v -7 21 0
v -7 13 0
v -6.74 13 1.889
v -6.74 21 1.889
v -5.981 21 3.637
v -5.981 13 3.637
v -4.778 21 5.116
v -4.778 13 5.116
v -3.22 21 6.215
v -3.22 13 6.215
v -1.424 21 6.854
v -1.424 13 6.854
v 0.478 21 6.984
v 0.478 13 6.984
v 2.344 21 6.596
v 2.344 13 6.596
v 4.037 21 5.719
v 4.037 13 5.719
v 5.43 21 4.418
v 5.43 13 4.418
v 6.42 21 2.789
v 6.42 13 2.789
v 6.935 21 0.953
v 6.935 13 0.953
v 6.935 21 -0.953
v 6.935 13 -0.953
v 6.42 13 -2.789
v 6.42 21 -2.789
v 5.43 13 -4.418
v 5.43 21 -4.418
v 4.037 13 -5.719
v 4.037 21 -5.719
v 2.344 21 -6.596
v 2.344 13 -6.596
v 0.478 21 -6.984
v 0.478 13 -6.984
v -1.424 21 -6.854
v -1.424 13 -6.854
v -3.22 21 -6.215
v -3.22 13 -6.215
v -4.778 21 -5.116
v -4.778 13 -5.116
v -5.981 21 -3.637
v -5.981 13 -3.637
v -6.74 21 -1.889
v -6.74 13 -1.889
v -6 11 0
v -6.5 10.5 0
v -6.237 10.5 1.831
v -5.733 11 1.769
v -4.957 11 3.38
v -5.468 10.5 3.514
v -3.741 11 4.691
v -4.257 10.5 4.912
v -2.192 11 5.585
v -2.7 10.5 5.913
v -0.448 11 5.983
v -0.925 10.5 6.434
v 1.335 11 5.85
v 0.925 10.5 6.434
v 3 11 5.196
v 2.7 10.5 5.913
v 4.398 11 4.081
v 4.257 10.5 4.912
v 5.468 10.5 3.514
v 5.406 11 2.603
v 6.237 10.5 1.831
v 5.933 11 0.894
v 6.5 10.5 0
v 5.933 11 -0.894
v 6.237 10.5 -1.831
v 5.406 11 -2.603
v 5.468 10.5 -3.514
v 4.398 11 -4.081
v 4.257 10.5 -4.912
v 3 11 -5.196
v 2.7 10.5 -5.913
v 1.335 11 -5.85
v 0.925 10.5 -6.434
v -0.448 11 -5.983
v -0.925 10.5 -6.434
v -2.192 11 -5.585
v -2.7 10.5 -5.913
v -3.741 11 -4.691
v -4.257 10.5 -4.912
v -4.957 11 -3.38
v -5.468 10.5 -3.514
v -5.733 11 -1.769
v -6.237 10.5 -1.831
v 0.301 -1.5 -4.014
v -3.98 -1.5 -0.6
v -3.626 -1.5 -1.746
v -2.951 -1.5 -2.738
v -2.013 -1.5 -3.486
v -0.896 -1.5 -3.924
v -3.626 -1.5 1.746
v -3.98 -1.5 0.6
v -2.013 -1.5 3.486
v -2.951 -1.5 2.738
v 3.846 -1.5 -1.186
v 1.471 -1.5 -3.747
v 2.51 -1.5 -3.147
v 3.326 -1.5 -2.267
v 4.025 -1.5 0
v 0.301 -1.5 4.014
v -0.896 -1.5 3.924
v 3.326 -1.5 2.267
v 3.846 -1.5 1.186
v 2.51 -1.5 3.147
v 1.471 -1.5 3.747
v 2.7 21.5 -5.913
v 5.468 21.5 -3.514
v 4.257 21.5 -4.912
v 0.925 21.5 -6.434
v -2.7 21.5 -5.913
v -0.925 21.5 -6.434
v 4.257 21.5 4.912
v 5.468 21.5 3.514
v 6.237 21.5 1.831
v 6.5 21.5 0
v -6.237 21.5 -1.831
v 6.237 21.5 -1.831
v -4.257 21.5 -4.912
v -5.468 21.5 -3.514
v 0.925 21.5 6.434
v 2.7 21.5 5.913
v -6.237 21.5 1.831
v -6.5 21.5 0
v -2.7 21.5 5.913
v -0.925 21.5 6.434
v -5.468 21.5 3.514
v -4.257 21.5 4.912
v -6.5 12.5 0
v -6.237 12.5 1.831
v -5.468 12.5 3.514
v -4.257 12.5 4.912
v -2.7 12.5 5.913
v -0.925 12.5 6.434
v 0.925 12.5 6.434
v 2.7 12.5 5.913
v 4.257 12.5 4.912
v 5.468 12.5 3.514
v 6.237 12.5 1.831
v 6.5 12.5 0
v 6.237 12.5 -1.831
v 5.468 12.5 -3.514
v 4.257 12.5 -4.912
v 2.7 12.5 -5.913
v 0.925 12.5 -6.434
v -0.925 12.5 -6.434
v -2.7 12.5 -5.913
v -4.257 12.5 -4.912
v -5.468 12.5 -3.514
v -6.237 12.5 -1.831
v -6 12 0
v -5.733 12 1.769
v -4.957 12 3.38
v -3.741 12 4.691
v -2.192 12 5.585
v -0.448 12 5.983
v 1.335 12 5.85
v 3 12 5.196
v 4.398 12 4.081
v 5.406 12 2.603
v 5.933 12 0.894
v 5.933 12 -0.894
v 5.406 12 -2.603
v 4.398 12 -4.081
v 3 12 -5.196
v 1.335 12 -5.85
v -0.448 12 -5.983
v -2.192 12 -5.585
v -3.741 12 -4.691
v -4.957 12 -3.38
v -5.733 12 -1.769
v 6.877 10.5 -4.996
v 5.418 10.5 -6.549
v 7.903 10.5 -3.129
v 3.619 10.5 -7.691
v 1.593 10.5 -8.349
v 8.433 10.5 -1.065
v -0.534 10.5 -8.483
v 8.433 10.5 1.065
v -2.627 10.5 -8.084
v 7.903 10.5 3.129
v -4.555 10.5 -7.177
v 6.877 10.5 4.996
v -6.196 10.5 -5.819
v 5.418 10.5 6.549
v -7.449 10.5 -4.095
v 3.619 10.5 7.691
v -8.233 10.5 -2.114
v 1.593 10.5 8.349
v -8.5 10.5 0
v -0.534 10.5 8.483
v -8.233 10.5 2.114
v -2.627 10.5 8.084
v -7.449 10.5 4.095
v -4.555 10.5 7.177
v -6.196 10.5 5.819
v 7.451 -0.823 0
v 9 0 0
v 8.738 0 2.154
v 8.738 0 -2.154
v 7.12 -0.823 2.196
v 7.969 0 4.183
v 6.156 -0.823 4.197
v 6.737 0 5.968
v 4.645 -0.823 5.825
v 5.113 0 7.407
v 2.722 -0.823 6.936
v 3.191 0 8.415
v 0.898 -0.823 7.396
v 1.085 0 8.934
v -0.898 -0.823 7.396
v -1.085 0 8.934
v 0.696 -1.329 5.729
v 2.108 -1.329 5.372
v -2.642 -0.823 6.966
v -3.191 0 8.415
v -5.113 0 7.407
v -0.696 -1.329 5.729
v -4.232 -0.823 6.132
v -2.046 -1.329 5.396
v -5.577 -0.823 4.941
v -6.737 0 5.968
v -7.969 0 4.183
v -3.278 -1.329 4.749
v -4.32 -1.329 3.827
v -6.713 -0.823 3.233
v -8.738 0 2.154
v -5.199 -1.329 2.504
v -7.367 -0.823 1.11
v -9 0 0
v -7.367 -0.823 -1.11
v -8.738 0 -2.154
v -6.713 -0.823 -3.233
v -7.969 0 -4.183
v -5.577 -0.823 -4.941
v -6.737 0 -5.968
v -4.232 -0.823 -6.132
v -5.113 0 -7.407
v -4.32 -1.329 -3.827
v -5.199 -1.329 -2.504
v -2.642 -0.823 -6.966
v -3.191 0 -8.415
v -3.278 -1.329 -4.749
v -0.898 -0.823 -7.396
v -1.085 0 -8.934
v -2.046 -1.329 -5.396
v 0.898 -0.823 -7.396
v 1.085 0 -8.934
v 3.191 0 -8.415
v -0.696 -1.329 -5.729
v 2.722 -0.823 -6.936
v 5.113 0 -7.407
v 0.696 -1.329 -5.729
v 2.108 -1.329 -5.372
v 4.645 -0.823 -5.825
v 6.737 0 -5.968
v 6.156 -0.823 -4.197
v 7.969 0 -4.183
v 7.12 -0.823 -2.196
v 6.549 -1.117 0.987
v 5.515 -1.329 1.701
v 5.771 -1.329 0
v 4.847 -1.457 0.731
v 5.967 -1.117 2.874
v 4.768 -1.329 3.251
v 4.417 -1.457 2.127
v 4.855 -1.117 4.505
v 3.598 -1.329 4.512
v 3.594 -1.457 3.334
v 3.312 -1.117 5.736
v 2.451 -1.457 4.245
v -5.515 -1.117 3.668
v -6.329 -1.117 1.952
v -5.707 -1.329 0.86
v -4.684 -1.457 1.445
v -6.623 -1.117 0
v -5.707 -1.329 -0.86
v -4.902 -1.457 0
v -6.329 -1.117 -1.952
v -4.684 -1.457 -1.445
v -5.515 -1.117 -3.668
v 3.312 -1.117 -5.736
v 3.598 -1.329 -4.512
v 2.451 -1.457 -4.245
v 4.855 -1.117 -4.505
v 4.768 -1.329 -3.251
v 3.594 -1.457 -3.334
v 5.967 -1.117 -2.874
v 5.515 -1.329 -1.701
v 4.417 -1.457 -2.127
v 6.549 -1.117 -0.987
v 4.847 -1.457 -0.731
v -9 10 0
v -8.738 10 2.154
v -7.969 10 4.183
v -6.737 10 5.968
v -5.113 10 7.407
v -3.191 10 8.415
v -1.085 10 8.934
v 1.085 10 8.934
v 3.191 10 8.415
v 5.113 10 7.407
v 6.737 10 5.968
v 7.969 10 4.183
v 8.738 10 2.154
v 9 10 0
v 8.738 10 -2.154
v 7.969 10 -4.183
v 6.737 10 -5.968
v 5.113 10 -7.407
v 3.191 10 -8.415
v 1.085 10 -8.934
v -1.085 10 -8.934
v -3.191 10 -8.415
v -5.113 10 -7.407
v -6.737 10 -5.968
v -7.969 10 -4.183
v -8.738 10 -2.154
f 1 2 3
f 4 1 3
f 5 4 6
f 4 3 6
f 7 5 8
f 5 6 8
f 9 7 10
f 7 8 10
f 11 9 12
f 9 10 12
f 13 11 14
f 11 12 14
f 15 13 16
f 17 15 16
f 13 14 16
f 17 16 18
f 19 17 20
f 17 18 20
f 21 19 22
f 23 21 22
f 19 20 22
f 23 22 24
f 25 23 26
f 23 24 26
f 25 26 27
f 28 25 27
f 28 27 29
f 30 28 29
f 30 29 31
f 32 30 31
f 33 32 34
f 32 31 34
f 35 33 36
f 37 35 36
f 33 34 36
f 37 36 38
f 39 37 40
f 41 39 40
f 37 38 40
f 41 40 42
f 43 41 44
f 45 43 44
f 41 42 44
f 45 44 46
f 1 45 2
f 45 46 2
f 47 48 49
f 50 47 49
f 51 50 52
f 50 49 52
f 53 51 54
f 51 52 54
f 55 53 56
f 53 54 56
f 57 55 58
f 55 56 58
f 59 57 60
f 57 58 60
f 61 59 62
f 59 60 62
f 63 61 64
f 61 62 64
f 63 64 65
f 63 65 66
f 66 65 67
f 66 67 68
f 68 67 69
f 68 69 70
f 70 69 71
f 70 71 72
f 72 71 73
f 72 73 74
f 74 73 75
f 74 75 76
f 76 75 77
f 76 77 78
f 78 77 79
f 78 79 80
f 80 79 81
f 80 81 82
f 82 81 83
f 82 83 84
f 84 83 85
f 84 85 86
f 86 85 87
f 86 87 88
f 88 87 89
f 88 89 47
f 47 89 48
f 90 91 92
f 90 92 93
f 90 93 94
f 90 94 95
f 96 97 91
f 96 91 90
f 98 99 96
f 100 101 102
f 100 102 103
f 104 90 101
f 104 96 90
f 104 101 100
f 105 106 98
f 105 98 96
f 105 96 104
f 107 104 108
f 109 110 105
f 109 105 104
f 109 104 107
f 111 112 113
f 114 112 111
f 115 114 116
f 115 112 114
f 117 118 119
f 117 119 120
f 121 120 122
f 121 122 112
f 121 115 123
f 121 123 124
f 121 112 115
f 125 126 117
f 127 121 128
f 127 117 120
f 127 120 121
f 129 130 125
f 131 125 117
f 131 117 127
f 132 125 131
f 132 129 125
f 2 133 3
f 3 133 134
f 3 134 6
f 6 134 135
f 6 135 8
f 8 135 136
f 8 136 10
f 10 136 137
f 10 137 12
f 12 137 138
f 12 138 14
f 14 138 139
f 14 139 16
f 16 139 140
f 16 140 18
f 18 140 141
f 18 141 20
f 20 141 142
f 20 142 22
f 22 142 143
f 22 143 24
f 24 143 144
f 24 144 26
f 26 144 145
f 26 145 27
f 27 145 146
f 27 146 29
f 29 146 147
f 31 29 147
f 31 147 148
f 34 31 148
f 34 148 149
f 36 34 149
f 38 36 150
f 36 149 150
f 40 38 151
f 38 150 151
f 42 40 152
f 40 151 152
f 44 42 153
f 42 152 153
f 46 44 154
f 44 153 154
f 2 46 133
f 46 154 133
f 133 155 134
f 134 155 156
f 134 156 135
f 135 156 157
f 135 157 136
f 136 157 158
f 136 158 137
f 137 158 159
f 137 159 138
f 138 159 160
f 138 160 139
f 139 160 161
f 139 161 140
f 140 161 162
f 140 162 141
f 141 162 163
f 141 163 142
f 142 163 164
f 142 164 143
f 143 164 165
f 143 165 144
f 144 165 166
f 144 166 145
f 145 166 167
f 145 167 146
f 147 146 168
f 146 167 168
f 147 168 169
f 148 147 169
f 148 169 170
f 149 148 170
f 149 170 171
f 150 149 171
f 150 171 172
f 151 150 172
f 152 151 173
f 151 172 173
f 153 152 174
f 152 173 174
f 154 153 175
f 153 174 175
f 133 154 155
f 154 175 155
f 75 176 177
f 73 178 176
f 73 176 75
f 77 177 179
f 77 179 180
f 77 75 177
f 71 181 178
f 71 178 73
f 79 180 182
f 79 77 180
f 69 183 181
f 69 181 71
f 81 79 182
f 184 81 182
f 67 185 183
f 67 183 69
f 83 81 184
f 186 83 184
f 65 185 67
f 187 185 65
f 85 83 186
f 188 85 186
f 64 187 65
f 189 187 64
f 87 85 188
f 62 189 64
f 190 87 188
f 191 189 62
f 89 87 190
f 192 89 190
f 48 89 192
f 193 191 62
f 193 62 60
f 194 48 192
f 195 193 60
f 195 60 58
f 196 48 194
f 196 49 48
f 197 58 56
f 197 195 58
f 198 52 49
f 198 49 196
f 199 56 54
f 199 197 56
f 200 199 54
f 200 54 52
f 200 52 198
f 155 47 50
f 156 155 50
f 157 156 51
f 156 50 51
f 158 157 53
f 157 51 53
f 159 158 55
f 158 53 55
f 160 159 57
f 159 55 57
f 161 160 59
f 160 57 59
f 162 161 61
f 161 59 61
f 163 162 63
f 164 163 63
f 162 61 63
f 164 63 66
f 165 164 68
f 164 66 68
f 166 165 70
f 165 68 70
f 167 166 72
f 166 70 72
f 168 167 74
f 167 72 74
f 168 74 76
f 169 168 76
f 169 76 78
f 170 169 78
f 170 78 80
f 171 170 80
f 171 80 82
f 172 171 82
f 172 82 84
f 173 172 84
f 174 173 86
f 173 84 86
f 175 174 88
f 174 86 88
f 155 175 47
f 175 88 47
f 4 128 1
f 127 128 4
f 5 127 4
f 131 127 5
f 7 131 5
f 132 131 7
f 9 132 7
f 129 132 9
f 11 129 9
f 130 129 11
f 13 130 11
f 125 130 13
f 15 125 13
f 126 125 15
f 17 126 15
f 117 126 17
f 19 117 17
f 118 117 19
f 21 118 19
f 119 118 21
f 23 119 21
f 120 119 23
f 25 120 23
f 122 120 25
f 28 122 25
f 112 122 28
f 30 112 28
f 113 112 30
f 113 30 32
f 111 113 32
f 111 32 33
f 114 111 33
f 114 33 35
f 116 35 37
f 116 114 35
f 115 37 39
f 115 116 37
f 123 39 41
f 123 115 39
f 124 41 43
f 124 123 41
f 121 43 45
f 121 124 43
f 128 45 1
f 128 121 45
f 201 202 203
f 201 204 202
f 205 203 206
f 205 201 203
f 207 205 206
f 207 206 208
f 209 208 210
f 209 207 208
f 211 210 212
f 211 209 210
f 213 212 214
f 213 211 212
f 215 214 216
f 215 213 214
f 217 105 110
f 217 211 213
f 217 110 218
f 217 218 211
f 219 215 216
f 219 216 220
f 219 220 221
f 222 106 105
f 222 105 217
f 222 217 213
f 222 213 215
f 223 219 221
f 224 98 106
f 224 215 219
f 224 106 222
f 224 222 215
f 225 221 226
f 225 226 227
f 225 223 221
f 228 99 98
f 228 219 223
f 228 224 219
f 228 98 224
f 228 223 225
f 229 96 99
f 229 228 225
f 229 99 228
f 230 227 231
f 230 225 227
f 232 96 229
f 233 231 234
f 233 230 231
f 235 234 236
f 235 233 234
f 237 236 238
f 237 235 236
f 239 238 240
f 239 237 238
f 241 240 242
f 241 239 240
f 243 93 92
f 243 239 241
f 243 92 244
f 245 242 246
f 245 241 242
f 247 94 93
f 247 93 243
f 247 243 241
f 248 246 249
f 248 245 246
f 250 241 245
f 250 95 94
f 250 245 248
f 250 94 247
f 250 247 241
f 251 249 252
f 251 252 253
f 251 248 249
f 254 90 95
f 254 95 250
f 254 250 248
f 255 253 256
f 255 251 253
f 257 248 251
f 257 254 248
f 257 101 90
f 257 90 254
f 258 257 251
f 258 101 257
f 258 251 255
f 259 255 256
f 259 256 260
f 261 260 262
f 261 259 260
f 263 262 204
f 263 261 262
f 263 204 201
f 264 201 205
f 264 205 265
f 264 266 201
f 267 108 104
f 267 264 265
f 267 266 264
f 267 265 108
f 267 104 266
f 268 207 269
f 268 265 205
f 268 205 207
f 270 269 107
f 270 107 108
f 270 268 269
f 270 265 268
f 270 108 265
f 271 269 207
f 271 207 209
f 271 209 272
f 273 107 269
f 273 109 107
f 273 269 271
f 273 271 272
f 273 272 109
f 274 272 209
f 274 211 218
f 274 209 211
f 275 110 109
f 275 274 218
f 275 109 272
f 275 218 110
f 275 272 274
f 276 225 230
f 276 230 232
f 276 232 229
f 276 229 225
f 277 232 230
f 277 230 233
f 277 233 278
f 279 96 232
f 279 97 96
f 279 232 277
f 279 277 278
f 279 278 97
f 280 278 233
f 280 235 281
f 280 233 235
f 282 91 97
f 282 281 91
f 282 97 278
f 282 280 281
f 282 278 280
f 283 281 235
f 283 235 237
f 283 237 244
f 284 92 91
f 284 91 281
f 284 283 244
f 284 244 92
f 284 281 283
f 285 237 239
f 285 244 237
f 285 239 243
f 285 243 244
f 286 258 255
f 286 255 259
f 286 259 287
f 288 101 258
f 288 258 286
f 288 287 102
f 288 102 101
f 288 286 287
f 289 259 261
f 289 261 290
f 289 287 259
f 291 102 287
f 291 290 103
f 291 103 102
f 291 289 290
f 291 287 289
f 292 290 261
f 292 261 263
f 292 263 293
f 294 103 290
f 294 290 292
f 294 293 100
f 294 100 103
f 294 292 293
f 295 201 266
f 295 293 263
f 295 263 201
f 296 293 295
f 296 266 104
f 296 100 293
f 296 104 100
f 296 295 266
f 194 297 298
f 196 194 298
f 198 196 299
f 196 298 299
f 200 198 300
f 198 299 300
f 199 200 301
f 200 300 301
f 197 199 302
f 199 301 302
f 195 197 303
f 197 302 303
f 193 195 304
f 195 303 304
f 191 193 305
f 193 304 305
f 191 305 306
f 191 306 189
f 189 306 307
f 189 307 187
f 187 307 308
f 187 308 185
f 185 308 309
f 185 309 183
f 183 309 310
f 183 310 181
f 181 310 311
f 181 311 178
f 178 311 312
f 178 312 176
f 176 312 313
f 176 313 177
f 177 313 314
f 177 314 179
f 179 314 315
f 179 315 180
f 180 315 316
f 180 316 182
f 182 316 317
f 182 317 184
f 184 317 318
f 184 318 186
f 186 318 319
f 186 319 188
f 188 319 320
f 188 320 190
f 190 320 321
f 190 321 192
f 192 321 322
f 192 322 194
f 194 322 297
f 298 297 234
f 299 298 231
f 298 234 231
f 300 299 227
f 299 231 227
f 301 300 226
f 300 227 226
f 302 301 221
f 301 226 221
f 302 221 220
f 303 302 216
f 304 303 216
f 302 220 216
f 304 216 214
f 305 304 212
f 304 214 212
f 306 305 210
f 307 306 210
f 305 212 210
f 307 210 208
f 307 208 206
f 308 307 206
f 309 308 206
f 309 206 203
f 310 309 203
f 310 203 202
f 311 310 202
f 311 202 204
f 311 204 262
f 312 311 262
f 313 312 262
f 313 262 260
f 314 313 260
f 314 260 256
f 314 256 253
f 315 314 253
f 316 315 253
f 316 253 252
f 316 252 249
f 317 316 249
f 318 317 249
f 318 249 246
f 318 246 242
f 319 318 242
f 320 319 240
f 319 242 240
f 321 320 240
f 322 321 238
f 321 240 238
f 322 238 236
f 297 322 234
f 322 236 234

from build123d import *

# Parameters (mm, degrees)
F0_R     = 9
F1_DEPTH = 1.5
F3_R     = 9
F4_DEPTH = 10.5
F5_R     = 6
F6_DEPTH = 2
F7_R     = 7
F8_DEPTH = 9
F9_SIZE  = 0.49999


# Not quite as in the source:
# - a fillet or chamfer that OpenCascade refuses, or shapes differently, is made with other operations: its cross-section is extruded or revolved along the edge and cut away or added
# - a fillet or chamfer is up to 0.001 mm smaller than in the source, because OpenCascade refuses the exact size


with BuildPart() as f1:
    # F0 (on Front) → F1 (new body)
    with BuildSketch(Plane.XZ):
        Circle(F0_R)
    extrude(amount=F1_DEPTH)

    # F2: fillet of radius 9 on 1 edges, made by hand

    # F2_s1 → F2_t2 (revolve, cut)
    with BuildSketch(Plane.XY):
        with BuildLine():
            ThreePointArc((9, 0), (6.6231390258, -1.1168439698), (4.0250628145, -1.5))
            Line((4.0250628145, -1.5), (4.0250628145, -1.68))
            Line((4.0250628145, -1.68), (9, -1.68))
            Line((9, -1.68), (9.18, -1.5))
            ThreePointArc((9.18, -1.5), (9.18, -0.75), (9.0994987437, -0.15))
            Line((9.0994987437, -0.15), (9, 0))
        make_face()
    revolve(axis=Axis((0, -1.5, 0), (0, -1, 0)), mode=Mode.SUBTRACT)

    # F3 (on face) → F4 (join)
    with BuildSketch(Plane(origin=(0, 0, 0), x_dir=(-1, 0, 0), z_dir=(0, 1, 0))):
        Circle(F3_R)
    extrude(amount=F4_DEPTH)

    # F5 (on face) → F6 (join)
    with BuildSketch(Plane(origin=(0, 10.5, 0), x_dir=(-1, 0, 0), z_dir=(0, 1, 0))):
        Circle(F5_R)
    extrude(amount=F6_DEPTH)

    # F7 (on face) → F8 (join)
    with BuildSketch(Plane(origin=(0, 12.5, 0), x_dir=(-1, 0, 0), z_dir=(0, 1, 0))):
        Circle(F7_R)
    extrude(amount=F8_DEPTH)

    # F9 (size 0.5 in the source; OpenCascade refuses exactly that, so slightly less here)
    f9_edges = [f1.edges().sort_by_distance(p)[0] for p in [
        (6, 12.5, 0),
        (6, 10.5, 0),
        (9, 10.5, 0),
        (7, 12.5, 0),
        (7, 21.5, 0),
    ]]
    chamfer(f9_edges, length=F9_SIZE)


solid = f1.part
